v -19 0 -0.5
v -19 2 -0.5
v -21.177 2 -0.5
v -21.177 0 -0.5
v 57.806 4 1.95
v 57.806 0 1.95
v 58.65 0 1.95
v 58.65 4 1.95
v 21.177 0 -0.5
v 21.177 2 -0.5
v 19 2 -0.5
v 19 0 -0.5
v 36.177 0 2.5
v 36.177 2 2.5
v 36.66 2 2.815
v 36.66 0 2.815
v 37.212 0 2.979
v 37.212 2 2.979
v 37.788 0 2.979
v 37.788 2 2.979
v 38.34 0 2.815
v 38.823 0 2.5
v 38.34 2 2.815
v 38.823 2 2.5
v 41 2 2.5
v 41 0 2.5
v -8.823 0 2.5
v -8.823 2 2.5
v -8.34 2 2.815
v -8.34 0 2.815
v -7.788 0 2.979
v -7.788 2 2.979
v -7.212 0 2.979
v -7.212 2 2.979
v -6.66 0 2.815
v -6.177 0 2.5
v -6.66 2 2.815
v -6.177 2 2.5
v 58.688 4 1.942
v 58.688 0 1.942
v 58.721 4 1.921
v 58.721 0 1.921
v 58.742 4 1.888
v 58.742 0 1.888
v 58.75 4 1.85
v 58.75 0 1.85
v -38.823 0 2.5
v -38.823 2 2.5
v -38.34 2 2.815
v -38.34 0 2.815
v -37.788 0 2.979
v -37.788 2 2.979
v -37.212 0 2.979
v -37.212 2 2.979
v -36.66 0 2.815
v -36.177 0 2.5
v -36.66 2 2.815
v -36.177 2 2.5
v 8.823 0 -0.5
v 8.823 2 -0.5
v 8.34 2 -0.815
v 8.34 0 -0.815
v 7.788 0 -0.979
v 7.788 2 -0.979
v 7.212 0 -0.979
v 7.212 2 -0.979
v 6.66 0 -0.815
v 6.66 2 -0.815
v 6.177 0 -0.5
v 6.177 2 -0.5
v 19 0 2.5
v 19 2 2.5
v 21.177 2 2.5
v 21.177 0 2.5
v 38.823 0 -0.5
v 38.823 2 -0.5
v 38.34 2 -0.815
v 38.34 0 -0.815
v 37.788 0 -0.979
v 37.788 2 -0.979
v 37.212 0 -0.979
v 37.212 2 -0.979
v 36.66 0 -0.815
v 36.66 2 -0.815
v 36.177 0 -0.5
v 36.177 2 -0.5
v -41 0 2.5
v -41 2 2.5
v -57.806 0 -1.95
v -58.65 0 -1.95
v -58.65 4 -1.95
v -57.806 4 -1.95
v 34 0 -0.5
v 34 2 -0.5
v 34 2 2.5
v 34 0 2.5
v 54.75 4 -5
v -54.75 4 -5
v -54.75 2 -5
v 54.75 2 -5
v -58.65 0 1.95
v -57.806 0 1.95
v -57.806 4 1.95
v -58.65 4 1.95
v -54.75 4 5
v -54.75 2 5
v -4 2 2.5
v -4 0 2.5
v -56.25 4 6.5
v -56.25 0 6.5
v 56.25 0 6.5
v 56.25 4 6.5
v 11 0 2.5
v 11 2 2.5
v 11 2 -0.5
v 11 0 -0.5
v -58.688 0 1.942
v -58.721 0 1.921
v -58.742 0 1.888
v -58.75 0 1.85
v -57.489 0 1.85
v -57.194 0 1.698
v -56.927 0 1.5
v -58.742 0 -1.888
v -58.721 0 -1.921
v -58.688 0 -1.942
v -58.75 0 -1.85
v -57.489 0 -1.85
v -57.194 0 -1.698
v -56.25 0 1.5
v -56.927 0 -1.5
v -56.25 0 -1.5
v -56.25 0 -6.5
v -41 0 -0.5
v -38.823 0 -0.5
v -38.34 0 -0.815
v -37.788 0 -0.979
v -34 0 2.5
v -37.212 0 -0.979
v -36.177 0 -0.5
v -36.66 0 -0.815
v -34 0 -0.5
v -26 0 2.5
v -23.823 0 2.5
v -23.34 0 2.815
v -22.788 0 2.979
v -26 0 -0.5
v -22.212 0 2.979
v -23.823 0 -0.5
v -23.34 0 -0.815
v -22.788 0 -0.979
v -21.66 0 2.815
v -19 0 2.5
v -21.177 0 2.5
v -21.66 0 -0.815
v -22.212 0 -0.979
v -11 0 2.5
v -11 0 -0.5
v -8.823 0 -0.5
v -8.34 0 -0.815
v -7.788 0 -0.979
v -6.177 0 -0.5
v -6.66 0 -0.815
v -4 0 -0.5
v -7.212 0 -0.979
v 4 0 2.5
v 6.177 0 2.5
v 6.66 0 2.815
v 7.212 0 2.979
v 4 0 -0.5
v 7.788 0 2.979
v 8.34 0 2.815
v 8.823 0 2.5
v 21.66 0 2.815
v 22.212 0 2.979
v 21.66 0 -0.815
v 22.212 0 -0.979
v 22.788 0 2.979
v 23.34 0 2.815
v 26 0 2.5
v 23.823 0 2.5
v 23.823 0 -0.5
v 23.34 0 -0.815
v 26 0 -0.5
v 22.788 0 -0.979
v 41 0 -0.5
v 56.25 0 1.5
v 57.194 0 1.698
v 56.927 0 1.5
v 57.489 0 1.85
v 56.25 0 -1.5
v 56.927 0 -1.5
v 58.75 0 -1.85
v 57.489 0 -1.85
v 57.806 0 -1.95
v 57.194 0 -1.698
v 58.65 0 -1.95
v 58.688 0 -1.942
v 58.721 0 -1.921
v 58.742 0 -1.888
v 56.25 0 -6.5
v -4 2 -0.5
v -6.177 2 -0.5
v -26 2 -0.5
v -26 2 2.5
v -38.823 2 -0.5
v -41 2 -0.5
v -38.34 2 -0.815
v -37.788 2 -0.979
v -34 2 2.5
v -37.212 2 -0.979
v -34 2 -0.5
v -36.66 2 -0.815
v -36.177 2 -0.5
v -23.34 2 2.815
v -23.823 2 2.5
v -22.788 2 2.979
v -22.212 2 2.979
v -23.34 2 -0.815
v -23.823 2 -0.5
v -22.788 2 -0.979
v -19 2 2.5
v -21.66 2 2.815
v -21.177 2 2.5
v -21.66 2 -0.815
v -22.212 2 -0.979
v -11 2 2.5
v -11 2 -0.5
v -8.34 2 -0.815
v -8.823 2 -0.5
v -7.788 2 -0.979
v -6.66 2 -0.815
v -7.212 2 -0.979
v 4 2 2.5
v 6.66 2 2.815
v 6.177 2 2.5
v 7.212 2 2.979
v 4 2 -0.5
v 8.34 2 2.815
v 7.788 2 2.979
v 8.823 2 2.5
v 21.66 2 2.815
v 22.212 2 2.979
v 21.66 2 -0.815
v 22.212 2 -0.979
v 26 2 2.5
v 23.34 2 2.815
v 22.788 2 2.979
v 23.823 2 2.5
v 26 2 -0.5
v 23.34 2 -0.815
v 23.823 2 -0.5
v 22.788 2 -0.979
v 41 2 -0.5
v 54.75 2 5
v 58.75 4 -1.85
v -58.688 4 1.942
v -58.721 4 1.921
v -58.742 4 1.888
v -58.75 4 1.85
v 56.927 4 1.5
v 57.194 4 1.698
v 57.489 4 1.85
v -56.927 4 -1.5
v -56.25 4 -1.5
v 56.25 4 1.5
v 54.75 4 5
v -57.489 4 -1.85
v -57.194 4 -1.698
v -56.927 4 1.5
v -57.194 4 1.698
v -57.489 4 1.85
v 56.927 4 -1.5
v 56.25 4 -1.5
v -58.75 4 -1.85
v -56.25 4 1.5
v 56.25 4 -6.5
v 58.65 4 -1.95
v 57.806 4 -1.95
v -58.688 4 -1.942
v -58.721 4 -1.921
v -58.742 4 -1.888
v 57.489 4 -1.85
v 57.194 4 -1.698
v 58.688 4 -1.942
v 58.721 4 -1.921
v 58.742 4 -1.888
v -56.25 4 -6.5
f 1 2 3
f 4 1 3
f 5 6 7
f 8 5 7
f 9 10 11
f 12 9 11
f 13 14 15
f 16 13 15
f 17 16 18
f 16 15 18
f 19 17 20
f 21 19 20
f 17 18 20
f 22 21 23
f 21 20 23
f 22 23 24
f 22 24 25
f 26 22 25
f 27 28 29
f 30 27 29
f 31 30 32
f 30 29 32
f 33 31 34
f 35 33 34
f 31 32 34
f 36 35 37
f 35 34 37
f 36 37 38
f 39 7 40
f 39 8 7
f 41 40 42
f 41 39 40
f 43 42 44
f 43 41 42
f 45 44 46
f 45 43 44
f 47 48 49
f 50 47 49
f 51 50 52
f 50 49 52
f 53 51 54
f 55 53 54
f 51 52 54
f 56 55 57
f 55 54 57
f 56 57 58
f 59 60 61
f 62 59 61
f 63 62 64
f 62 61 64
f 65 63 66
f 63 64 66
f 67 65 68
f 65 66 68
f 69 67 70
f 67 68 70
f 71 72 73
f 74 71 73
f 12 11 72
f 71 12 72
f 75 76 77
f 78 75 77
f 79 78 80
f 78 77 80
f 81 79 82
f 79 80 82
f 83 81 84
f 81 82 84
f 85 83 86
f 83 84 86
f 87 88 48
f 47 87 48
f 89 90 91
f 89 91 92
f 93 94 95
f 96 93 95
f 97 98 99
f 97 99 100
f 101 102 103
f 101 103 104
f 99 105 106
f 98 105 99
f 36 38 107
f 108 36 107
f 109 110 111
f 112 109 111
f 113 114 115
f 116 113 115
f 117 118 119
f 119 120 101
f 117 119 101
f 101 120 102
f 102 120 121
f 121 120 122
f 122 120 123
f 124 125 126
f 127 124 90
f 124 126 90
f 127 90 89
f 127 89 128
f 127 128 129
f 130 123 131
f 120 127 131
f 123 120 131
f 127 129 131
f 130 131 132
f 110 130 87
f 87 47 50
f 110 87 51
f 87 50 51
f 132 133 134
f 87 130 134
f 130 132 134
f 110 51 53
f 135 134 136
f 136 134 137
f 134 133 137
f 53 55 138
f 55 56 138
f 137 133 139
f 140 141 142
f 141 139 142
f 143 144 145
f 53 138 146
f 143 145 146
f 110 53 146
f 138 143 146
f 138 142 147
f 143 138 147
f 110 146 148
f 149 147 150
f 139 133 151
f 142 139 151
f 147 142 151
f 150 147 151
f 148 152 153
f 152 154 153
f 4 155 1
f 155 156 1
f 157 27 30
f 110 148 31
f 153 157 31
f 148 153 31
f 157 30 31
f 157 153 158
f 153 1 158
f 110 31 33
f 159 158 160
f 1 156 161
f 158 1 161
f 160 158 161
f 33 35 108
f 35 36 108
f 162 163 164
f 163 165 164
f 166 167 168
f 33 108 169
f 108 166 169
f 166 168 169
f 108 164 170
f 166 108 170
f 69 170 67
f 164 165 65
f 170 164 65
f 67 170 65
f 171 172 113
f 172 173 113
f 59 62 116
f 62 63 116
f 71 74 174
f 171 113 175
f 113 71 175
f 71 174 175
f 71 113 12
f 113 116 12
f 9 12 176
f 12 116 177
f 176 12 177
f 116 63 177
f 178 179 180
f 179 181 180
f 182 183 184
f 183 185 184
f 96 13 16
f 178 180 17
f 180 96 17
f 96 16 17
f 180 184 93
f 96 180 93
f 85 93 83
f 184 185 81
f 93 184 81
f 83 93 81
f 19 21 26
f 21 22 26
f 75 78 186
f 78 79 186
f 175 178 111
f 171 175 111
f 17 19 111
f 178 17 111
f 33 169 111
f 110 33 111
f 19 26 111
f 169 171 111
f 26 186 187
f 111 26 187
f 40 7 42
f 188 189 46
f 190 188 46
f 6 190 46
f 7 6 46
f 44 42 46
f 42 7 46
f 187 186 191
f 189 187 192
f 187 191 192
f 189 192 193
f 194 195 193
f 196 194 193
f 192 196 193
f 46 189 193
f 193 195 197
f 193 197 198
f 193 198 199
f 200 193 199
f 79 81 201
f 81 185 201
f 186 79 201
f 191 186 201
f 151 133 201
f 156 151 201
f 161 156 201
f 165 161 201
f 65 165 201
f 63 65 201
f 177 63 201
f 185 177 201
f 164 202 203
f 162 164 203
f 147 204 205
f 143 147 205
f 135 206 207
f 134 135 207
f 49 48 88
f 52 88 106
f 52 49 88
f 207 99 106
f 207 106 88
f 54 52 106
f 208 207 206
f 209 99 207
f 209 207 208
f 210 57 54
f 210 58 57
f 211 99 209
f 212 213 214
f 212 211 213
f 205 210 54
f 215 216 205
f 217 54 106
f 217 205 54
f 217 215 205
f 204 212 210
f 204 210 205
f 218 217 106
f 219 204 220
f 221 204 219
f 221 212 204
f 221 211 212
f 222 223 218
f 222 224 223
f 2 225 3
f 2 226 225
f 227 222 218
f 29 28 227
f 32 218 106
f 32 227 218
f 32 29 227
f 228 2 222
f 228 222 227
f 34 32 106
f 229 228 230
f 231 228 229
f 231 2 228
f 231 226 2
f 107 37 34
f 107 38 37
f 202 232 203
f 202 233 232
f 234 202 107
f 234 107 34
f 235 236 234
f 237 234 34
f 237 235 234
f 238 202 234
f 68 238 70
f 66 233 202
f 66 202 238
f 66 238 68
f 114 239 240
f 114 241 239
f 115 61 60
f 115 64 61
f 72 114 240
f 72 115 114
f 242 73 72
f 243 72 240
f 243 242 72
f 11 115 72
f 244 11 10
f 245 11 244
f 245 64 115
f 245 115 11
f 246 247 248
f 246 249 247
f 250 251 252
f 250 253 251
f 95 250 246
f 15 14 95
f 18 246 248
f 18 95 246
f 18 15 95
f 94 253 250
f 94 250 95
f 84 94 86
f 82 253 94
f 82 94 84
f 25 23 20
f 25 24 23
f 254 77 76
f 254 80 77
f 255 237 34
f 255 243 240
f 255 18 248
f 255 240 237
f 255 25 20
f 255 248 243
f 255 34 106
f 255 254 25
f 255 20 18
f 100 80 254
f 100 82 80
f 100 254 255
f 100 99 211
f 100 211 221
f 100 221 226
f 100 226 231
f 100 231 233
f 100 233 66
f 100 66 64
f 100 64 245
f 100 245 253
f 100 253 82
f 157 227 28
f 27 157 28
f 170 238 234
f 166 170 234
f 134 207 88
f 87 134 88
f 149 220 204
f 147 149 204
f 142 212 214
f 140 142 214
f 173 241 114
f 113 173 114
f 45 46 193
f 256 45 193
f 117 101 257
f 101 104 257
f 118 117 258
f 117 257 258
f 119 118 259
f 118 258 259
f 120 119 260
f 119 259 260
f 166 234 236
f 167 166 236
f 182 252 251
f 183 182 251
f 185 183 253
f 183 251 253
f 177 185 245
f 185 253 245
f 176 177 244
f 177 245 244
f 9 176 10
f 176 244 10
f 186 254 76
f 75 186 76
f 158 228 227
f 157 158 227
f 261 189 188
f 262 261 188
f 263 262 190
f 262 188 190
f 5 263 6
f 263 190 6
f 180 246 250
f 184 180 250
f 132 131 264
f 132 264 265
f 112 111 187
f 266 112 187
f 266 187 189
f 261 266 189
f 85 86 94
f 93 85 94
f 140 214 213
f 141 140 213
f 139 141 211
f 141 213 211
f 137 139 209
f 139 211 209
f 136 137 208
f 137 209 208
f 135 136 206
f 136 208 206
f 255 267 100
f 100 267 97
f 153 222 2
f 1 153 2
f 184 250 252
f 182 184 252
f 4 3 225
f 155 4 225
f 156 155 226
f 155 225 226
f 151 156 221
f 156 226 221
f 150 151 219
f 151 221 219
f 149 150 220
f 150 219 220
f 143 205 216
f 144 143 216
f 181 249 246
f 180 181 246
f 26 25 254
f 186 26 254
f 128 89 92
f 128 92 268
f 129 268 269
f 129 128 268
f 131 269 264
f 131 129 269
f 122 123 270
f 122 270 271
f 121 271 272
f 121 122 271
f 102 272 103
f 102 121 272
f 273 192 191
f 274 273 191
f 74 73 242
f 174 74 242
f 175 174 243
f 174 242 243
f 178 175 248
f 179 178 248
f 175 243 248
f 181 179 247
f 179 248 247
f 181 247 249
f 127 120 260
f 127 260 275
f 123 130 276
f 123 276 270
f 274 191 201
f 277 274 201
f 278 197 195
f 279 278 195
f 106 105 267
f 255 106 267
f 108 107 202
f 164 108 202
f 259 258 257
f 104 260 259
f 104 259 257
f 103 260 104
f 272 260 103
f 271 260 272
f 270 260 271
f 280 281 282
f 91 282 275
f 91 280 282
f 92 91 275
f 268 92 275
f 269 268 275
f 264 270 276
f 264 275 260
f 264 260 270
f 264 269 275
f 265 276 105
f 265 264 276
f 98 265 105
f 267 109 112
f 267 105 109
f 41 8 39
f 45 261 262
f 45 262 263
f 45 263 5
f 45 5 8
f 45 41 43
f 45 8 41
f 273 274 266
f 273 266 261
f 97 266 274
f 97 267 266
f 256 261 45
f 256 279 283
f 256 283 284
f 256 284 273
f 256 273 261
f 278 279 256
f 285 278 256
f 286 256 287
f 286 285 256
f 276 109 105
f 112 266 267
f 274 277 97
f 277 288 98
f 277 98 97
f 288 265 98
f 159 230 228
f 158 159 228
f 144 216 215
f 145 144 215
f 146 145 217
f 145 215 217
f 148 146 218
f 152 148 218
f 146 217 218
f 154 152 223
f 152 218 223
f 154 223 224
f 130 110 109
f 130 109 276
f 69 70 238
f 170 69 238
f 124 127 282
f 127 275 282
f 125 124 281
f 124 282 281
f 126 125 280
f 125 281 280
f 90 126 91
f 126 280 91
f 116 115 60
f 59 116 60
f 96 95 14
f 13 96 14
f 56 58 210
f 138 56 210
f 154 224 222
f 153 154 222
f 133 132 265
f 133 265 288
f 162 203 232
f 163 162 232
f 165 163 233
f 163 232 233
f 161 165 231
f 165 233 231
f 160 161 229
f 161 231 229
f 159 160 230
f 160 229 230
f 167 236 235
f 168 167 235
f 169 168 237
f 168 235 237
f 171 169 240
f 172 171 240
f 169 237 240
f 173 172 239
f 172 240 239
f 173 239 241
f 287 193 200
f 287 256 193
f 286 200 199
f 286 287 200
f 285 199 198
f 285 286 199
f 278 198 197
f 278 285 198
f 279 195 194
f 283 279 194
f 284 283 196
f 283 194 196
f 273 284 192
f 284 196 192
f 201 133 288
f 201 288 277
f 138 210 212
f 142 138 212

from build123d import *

# Parameters (mm, degrees)
SKETCH_1_W                 = 112.5
SKETCH_1_H                 = 13
EXTRUDE_1_DEPTH            = 4
EXTRUDE_2_DEPTH            = 4
SKETCH_3_W                 = 109.5
SKETCH_3_H                 = 10
CUT_EXTRUDE_1_DEPTH        = 2
CUT_EXTRUDE_2_REACH        = 61.142
PATTERN_LINEAR_1_COUNT     = 4
PATTERN_LINEAR_1_PITCH     = 15
PATTERN_LINEAR_1_COL_COUNT = 3
PATTERN_LINEAR_1_COL_PITCH = 15
FILLET_1_R                 = 0.1


with BuildPart() as part:
    # 草图1 → 凸台-拉伸1 (new body)
    with BuildSketch(Plane(origin=(0, 0, 0), x_dir=(1, 0, 0), z_dir=(0, 1, 0))):
        Rectangle(SKETCH_1_W, SKETCH_1_H)
    extrude(amount=EXTRUDE_1_DEPTH)

    # 草图2 → 凸台-拉伸2 (add)
    with BuildSketch(Plane.XZ):
        with BuildLine():
            Line((56.25, -1.5), (56.25, 1.5))
            Line((56.25, 1.5), (56.927124344, 1.5))
            ThreePointArc((56.927124344, 1.5), (57.338161527, 1.780042303), (57.805590279, 1.95))
            Line((57.805590279, 1.95), (58.75, 1.95))
            Line((58.75, 1.95), (58.75, -1.95))
            Line((58.75, -1.95), (57.805590279, -1.95))
            ThreePointArc((57.805590279, -1.95), (57.338161527, -1.780042303), (56.927124344, -1.5))
            Line((56.927124344, -1.5), (56.25, -1.5))
        make_face()
    extrude_2 = extrude(amount=-EXTRUDE_2_DEPTH)

    # 镜向1: 凸台-拉伸2 across plane
    add(extrude_2.mirror(Plane(origin=(0, 0, 0), x_dir=(0, 0, 1), z_dir=(1, 0, 0))))

    # 草图3 → 切除-拉伸1 (cut)
    with BuildSketch(Plane(origin=(0, 4, 0), x_dir=(1, 0, 0), z_dir=(0, 1, 0))):
        Rectangle(SKETCH_3_W, SKETCH_3_H)
    extrude(amount=-CUT_EXTRUDE_1_DEPTH, mode=Mode.SUBTRACT)

    # 草图4 → 切除-拉伸2 (cut, up to next)
    with BuildSketch(Plane(origin=(0, 2, 0), x_dir=(1, 0, 0), z_dir=(0, 1, 0)), mode=Mode.PRIVATE) as cut_extrude_2_sk1:
        with BuildLine():
            Line((-4, -2.5), (-4, 0.5))
            Line((-4, 0.5), (-6.177124344, 0.5))
            ThreePointArc((-6.177124344, 0.5), (-7.5, 1), (-8.822875656, 0.5))
            Line((-8.822875656, 0.5), (-11, 0.5))
            Line((-11, 0.5), (-11, -2.5))
            Line((-11, -2.5), (-8.822875656, -2.5))
            ThreePointArc((-8.822875656, -2.5), (-7.5, -3), (-6.177124344, -2.5))
            Line((-6.177124344, -2.5), (-4, -2.5))
        make_face()
    cut_extrude_2_tool1 = extrude(cut_extrude_2_sk1.sketch, amount=-CUT_EXTRUDE_2_REACH, mode=Mode.PRIVATE) & part.part
    cut_extrude_2 = cut_extrude_2_tool1.solids().sort_by_distance((-7.5, 2, 1))[0]
    add(cut_extrude_2, mode=Mode.SUBTRACT)

    # 阵列(线性)1: 切除-拉伸2 ×4
    with Locations(*[(i * PATTERN_LINEAR_1_PITCH, 0, 0) for i in range(1, PATTERN_LINEAR_1_COUNT)]):
        add(cut_extrude_2, mode=Mode.SUBTRACT)

    # 阵列(线性)1 col: 切除-拉伸2 ×3
    with Locations(*[(-i * PATTERN_LINEAR_1_COL_PITCH, 0, 0) for i in range(1, PATTERN_LINEAR_1_COL_COUNT)]):
        add(cut_extrude_2, mode=Mode.SUBTRACT)

    # 圆角1
    fillet_1_edges = [part.edges().sort_by_distance(p)[0] for p in [
        (58.75, 2, -1.95),
        (58.75, 2, 1.95),
        (-58.75, 2, -1.95),
        (-58.75, 2, 1.95),
    ]]
    fillet(fillet_1_edges, radius=FILLET_1_R)


solid = part.part
